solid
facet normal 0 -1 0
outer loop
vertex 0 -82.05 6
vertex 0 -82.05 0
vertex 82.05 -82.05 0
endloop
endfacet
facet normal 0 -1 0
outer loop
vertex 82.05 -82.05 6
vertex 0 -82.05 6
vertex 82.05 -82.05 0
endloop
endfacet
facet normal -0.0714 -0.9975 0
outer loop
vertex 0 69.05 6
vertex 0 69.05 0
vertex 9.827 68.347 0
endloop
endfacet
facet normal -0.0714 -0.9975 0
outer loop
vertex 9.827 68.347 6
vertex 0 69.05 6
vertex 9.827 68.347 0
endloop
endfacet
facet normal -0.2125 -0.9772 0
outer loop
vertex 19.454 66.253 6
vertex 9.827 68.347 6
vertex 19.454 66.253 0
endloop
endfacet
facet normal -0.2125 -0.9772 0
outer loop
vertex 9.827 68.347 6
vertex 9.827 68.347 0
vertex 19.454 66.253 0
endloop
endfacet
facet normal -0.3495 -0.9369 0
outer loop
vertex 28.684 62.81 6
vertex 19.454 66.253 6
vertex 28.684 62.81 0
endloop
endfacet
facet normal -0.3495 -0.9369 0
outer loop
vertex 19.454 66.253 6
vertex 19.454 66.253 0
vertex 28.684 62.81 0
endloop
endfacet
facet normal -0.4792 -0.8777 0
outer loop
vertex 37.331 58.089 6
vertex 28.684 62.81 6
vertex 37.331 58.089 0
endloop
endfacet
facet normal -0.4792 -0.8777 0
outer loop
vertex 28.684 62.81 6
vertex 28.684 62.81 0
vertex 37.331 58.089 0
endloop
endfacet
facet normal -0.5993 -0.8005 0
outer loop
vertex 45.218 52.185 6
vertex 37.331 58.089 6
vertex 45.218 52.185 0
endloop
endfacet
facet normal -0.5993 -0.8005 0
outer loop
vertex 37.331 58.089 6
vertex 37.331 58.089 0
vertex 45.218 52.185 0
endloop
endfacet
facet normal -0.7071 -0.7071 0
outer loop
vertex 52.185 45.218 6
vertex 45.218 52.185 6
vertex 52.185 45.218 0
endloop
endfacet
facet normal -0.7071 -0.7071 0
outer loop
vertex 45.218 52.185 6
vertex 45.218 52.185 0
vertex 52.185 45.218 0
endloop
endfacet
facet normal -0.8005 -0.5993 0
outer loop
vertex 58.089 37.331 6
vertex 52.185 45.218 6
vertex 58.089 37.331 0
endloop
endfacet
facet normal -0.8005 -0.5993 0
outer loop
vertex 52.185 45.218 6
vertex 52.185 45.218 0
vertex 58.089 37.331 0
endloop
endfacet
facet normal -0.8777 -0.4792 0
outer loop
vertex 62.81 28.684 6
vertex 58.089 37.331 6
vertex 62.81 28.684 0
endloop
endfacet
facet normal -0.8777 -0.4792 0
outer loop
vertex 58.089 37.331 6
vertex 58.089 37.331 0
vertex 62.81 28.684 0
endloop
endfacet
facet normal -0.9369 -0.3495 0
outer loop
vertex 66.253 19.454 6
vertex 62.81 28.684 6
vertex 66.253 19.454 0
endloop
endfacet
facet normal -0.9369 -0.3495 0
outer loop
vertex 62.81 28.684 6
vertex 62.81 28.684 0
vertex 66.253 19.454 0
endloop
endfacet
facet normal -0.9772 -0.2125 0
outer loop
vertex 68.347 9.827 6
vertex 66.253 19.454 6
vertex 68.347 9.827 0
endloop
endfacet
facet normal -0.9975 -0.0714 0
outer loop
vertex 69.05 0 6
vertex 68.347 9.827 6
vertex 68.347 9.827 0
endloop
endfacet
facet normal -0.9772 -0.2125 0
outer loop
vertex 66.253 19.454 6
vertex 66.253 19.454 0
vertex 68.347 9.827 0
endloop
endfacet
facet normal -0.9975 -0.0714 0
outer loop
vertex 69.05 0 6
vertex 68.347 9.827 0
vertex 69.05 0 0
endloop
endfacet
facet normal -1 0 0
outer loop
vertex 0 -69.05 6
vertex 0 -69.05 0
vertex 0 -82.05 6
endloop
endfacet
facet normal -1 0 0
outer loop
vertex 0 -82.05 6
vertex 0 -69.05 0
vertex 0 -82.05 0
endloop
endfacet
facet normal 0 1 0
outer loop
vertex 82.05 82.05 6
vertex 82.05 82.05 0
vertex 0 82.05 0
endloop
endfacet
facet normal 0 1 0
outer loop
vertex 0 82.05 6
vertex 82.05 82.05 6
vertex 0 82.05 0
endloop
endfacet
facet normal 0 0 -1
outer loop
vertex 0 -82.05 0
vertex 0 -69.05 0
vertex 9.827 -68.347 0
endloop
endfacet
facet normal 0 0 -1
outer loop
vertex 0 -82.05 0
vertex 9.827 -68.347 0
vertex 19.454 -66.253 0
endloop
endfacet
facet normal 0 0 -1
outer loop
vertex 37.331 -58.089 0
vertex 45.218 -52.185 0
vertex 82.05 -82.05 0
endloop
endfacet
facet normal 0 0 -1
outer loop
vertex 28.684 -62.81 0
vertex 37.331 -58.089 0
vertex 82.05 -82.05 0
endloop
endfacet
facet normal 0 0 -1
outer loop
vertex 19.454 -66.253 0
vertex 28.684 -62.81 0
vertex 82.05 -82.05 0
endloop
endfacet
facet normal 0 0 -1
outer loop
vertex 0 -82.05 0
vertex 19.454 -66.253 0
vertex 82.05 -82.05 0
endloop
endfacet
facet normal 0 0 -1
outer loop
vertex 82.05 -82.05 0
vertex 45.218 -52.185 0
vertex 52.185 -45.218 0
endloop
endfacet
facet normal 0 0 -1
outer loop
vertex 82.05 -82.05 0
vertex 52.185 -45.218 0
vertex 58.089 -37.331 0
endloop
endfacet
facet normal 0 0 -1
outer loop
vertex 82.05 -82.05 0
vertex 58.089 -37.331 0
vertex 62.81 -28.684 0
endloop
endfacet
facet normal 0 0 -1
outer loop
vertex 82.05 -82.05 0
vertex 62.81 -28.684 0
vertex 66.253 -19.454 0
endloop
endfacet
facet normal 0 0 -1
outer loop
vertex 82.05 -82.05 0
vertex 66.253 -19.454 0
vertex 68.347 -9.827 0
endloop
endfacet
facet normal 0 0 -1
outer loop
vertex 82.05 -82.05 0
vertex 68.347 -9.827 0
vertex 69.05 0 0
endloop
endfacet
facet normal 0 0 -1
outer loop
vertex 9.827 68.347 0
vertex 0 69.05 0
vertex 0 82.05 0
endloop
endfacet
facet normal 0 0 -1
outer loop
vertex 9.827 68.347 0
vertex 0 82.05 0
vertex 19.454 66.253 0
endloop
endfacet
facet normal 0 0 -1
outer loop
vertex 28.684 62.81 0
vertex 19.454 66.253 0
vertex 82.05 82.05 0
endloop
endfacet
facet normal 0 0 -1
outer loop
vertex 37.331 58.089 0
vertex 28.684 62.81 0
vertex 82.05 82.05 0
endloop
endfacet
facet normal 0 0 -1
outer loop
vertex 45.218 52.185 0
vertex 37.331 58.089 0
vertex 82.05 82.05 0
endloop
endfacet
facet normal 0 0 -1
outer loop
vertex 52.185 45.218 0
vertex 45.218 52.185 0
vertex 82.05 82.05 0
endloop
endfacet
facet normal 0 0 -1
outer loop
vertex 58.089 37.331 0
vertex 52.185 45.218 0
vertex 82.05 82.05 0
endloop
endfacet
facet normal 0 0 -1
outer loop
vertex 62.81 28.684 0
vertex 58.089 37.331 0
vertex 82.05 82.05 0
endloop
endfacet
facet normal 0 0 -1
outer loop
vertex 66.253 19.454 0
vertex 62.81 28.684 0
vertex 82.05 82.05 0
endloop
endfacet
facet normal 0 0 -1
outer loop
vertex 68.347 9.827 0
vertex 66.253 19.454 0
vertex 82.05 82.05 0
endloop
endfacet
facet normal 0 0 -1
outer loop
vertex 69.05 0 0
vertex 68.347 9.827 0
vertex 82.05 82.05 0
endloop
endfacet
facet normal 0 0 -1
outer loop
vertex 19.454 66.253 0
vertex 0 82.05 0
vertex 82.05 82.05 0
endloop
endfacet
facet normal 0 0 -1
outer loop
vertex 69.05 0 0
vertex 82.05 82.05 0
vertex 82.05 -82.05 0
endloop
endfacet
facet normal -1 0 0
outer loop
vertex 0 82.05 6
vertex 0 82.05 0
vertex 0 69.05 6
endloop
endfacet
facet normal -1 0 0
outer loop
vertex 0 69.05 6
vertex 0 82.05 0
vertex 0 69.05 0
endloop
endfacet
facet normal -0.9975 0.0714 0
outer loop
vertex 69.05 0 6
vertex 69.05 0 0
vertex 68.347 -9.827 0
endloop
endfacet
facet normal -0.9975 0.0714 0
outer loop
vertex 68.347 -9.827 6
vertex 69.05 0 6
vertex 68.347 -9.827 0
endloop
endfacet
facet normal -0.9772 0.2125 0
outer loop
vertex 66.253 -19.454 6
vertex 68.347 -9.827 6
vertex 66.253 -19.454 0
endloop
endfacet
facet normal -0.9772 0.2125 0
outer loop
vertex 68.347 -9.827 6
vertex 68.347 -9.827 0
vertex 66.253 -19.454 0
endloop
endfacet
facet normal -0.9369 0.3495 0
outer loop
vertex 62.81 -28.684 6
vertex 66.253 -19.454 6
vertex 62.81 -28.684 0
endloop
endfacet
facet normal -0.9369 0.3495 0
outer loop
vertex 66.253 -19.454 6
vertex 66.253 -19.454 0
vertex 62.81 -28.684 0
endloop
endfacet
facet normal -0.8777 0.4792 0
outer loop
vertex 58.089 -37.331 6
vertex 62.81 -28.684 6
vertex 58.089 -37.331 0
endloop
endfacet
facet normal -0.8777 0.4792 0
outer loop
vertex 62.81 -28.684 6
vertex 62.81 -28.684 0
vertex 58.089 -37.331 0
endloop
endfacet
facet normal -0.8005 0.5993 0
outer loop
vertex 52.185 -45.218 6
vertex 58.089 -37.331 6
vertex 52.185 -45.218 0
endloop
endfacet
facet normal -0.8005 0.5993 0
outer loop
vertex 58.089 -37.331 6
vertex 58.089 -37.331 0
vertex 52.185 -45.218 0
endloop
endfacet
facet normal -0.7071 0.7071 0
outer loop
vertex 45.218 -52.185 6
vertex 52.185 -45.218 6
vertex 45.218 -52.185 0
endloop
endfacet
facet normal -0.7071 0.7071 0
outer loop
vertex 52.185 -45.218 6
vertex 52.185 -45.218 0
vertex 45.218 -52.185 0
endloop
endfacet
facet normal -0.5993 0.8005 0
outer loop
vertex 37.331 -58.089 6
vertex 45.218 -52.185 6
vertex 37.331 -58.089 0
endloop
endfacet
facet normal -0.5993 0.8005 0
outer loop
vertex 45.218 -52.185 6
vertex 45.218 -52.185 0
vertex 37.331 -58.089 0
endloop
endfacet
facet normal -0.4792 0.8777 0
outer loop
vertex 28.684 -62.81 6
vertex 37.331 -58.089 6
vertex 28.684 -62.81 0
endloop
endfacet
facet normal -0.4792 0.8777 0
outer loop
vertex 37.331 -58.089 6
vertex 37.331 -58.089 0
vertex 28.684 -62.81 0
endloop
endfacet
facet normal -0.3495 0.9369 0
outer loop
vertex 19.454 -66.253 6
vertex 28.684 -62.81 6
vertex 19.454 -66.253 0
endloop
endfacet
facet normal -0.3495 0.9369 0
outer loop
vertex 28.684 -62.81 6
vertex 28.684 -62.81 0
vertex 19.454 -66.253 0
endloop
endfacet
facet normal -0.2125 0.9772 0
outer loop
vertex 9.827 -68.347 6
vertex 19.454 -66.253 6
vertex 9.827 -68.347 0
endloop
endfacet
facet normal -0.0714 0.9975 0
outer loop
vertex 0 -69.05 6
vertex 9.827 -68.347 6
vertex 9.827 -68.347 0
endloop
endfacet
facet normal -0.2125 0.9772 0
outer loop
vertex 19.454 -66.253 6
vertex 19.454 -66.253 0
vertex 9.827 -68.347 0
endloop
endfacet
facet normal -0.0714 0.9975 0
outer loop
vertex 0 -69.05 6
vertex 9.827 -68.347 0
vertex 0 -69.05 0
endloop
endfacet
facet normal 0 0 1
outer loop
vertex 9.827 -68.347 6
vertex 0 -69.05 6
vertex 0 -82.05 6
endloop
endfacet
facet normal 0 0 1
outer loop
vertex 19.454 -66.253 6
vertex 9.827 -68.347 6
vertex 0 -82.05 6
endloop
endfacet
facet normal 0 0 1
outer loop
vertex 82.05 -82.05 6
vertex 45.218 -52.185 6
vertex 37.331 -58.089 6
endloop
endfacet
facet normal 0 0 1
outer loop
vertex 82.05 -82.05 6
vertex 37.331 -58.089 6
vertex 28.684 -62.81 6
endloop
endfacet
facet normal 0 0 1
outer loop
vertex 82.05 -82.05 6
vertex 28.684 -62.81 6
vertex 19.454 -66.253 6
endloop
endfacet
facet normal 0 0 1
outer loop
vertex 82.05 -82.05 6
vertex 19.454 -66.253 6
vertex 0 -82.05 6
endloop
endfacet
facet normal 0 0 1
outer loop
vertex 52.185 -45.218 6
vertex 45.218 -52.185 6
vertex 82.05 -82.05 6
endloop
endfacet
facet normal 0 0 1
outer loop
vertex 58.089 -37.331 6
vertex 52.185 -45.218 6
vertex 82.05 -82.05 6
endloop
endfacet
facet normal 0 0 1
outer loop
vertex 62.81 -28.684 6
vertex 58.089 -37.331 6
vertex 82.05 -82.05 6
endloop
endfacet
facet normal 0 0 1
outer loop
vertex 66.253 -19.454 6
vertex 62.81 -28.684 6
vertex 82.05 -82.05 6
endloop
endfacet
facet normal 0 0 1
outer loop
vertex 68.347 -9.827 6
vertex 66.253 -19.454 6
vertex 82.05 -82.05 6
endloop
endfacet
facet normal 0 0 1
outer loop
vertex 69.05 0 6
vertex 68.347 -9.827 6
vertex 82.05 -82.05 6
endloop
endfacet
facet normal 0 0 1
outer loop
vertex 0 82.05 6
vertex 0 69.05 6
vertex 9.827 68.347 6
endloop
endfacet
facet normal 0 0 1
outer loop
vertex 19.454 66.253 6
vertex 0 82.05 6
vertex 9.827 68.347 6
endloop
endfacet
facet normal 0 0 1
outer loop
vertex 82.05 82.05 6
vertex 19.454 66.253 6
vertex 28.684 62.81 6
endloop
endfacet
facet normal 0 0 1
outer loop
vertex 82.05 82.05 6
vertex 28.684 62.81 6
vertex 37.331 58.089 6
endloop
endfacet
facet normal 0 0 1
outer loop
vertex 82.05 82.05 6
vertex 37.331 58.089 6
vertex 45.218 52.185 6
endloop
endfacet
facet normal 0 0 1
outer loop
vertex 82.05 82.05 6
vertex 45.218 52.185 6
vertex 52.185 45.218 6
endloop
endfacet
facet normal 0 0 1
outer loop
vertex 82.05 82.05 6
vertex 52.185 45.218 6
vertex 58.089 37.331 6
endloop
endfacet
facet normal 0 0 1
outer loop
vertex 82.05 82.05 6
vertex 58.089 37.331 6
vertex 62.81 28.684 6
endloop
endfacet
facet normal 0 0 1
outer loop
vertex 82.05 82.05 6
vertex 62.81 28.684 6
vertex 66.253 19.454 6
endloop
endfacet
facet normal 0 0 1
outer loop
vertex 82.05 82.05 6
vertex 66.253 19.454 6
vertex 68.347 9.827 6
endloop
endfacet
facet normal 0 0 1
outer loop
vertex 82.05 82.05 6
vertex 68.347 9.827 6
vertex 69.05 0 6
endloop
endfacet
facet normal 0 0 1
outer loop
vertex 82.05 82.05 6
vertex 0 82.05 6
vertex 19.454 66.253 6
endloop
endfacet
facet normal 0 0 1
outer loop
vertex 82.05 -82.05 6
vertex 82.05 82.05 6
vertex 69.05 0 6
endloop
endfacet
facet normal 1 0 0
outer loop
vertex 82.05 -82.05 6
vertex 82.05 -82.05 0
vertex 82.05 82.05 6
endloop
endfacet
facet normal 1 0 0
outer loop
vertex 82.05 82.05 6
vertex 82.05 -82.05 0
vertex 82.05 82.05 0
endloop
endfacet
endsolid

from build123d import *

# Parameters (mm, degrees)
EXTRUDE_1_DEPTH = 6


with BuildPart() as part:
    # Эскиз1 → Бобышка-Вытянуть1 (new body)
    with BuildSketch(Plane.XY):
        with BuildLine():
            Line((82.05, 82.05), (0, 82.05))
            Line((0, 82.05), (0, 69.05))
            ThreePointArc((0, 69.05), (48.825723241, 48.825723241), (69.05, 0))
            ThreePointArc((69.05, 0), (48.825723241, -48.825723241), (0, -69.05))
            Line((0, -69.05), (0, -82.05))
            Line((0, -82.05), (82.05, -82.05))
            Line((82.05, -82.05), (82.05, 82.05))
        make_face()
    extrude(amount=EXTRUDE_1_DEPTH)


solid = part.part
